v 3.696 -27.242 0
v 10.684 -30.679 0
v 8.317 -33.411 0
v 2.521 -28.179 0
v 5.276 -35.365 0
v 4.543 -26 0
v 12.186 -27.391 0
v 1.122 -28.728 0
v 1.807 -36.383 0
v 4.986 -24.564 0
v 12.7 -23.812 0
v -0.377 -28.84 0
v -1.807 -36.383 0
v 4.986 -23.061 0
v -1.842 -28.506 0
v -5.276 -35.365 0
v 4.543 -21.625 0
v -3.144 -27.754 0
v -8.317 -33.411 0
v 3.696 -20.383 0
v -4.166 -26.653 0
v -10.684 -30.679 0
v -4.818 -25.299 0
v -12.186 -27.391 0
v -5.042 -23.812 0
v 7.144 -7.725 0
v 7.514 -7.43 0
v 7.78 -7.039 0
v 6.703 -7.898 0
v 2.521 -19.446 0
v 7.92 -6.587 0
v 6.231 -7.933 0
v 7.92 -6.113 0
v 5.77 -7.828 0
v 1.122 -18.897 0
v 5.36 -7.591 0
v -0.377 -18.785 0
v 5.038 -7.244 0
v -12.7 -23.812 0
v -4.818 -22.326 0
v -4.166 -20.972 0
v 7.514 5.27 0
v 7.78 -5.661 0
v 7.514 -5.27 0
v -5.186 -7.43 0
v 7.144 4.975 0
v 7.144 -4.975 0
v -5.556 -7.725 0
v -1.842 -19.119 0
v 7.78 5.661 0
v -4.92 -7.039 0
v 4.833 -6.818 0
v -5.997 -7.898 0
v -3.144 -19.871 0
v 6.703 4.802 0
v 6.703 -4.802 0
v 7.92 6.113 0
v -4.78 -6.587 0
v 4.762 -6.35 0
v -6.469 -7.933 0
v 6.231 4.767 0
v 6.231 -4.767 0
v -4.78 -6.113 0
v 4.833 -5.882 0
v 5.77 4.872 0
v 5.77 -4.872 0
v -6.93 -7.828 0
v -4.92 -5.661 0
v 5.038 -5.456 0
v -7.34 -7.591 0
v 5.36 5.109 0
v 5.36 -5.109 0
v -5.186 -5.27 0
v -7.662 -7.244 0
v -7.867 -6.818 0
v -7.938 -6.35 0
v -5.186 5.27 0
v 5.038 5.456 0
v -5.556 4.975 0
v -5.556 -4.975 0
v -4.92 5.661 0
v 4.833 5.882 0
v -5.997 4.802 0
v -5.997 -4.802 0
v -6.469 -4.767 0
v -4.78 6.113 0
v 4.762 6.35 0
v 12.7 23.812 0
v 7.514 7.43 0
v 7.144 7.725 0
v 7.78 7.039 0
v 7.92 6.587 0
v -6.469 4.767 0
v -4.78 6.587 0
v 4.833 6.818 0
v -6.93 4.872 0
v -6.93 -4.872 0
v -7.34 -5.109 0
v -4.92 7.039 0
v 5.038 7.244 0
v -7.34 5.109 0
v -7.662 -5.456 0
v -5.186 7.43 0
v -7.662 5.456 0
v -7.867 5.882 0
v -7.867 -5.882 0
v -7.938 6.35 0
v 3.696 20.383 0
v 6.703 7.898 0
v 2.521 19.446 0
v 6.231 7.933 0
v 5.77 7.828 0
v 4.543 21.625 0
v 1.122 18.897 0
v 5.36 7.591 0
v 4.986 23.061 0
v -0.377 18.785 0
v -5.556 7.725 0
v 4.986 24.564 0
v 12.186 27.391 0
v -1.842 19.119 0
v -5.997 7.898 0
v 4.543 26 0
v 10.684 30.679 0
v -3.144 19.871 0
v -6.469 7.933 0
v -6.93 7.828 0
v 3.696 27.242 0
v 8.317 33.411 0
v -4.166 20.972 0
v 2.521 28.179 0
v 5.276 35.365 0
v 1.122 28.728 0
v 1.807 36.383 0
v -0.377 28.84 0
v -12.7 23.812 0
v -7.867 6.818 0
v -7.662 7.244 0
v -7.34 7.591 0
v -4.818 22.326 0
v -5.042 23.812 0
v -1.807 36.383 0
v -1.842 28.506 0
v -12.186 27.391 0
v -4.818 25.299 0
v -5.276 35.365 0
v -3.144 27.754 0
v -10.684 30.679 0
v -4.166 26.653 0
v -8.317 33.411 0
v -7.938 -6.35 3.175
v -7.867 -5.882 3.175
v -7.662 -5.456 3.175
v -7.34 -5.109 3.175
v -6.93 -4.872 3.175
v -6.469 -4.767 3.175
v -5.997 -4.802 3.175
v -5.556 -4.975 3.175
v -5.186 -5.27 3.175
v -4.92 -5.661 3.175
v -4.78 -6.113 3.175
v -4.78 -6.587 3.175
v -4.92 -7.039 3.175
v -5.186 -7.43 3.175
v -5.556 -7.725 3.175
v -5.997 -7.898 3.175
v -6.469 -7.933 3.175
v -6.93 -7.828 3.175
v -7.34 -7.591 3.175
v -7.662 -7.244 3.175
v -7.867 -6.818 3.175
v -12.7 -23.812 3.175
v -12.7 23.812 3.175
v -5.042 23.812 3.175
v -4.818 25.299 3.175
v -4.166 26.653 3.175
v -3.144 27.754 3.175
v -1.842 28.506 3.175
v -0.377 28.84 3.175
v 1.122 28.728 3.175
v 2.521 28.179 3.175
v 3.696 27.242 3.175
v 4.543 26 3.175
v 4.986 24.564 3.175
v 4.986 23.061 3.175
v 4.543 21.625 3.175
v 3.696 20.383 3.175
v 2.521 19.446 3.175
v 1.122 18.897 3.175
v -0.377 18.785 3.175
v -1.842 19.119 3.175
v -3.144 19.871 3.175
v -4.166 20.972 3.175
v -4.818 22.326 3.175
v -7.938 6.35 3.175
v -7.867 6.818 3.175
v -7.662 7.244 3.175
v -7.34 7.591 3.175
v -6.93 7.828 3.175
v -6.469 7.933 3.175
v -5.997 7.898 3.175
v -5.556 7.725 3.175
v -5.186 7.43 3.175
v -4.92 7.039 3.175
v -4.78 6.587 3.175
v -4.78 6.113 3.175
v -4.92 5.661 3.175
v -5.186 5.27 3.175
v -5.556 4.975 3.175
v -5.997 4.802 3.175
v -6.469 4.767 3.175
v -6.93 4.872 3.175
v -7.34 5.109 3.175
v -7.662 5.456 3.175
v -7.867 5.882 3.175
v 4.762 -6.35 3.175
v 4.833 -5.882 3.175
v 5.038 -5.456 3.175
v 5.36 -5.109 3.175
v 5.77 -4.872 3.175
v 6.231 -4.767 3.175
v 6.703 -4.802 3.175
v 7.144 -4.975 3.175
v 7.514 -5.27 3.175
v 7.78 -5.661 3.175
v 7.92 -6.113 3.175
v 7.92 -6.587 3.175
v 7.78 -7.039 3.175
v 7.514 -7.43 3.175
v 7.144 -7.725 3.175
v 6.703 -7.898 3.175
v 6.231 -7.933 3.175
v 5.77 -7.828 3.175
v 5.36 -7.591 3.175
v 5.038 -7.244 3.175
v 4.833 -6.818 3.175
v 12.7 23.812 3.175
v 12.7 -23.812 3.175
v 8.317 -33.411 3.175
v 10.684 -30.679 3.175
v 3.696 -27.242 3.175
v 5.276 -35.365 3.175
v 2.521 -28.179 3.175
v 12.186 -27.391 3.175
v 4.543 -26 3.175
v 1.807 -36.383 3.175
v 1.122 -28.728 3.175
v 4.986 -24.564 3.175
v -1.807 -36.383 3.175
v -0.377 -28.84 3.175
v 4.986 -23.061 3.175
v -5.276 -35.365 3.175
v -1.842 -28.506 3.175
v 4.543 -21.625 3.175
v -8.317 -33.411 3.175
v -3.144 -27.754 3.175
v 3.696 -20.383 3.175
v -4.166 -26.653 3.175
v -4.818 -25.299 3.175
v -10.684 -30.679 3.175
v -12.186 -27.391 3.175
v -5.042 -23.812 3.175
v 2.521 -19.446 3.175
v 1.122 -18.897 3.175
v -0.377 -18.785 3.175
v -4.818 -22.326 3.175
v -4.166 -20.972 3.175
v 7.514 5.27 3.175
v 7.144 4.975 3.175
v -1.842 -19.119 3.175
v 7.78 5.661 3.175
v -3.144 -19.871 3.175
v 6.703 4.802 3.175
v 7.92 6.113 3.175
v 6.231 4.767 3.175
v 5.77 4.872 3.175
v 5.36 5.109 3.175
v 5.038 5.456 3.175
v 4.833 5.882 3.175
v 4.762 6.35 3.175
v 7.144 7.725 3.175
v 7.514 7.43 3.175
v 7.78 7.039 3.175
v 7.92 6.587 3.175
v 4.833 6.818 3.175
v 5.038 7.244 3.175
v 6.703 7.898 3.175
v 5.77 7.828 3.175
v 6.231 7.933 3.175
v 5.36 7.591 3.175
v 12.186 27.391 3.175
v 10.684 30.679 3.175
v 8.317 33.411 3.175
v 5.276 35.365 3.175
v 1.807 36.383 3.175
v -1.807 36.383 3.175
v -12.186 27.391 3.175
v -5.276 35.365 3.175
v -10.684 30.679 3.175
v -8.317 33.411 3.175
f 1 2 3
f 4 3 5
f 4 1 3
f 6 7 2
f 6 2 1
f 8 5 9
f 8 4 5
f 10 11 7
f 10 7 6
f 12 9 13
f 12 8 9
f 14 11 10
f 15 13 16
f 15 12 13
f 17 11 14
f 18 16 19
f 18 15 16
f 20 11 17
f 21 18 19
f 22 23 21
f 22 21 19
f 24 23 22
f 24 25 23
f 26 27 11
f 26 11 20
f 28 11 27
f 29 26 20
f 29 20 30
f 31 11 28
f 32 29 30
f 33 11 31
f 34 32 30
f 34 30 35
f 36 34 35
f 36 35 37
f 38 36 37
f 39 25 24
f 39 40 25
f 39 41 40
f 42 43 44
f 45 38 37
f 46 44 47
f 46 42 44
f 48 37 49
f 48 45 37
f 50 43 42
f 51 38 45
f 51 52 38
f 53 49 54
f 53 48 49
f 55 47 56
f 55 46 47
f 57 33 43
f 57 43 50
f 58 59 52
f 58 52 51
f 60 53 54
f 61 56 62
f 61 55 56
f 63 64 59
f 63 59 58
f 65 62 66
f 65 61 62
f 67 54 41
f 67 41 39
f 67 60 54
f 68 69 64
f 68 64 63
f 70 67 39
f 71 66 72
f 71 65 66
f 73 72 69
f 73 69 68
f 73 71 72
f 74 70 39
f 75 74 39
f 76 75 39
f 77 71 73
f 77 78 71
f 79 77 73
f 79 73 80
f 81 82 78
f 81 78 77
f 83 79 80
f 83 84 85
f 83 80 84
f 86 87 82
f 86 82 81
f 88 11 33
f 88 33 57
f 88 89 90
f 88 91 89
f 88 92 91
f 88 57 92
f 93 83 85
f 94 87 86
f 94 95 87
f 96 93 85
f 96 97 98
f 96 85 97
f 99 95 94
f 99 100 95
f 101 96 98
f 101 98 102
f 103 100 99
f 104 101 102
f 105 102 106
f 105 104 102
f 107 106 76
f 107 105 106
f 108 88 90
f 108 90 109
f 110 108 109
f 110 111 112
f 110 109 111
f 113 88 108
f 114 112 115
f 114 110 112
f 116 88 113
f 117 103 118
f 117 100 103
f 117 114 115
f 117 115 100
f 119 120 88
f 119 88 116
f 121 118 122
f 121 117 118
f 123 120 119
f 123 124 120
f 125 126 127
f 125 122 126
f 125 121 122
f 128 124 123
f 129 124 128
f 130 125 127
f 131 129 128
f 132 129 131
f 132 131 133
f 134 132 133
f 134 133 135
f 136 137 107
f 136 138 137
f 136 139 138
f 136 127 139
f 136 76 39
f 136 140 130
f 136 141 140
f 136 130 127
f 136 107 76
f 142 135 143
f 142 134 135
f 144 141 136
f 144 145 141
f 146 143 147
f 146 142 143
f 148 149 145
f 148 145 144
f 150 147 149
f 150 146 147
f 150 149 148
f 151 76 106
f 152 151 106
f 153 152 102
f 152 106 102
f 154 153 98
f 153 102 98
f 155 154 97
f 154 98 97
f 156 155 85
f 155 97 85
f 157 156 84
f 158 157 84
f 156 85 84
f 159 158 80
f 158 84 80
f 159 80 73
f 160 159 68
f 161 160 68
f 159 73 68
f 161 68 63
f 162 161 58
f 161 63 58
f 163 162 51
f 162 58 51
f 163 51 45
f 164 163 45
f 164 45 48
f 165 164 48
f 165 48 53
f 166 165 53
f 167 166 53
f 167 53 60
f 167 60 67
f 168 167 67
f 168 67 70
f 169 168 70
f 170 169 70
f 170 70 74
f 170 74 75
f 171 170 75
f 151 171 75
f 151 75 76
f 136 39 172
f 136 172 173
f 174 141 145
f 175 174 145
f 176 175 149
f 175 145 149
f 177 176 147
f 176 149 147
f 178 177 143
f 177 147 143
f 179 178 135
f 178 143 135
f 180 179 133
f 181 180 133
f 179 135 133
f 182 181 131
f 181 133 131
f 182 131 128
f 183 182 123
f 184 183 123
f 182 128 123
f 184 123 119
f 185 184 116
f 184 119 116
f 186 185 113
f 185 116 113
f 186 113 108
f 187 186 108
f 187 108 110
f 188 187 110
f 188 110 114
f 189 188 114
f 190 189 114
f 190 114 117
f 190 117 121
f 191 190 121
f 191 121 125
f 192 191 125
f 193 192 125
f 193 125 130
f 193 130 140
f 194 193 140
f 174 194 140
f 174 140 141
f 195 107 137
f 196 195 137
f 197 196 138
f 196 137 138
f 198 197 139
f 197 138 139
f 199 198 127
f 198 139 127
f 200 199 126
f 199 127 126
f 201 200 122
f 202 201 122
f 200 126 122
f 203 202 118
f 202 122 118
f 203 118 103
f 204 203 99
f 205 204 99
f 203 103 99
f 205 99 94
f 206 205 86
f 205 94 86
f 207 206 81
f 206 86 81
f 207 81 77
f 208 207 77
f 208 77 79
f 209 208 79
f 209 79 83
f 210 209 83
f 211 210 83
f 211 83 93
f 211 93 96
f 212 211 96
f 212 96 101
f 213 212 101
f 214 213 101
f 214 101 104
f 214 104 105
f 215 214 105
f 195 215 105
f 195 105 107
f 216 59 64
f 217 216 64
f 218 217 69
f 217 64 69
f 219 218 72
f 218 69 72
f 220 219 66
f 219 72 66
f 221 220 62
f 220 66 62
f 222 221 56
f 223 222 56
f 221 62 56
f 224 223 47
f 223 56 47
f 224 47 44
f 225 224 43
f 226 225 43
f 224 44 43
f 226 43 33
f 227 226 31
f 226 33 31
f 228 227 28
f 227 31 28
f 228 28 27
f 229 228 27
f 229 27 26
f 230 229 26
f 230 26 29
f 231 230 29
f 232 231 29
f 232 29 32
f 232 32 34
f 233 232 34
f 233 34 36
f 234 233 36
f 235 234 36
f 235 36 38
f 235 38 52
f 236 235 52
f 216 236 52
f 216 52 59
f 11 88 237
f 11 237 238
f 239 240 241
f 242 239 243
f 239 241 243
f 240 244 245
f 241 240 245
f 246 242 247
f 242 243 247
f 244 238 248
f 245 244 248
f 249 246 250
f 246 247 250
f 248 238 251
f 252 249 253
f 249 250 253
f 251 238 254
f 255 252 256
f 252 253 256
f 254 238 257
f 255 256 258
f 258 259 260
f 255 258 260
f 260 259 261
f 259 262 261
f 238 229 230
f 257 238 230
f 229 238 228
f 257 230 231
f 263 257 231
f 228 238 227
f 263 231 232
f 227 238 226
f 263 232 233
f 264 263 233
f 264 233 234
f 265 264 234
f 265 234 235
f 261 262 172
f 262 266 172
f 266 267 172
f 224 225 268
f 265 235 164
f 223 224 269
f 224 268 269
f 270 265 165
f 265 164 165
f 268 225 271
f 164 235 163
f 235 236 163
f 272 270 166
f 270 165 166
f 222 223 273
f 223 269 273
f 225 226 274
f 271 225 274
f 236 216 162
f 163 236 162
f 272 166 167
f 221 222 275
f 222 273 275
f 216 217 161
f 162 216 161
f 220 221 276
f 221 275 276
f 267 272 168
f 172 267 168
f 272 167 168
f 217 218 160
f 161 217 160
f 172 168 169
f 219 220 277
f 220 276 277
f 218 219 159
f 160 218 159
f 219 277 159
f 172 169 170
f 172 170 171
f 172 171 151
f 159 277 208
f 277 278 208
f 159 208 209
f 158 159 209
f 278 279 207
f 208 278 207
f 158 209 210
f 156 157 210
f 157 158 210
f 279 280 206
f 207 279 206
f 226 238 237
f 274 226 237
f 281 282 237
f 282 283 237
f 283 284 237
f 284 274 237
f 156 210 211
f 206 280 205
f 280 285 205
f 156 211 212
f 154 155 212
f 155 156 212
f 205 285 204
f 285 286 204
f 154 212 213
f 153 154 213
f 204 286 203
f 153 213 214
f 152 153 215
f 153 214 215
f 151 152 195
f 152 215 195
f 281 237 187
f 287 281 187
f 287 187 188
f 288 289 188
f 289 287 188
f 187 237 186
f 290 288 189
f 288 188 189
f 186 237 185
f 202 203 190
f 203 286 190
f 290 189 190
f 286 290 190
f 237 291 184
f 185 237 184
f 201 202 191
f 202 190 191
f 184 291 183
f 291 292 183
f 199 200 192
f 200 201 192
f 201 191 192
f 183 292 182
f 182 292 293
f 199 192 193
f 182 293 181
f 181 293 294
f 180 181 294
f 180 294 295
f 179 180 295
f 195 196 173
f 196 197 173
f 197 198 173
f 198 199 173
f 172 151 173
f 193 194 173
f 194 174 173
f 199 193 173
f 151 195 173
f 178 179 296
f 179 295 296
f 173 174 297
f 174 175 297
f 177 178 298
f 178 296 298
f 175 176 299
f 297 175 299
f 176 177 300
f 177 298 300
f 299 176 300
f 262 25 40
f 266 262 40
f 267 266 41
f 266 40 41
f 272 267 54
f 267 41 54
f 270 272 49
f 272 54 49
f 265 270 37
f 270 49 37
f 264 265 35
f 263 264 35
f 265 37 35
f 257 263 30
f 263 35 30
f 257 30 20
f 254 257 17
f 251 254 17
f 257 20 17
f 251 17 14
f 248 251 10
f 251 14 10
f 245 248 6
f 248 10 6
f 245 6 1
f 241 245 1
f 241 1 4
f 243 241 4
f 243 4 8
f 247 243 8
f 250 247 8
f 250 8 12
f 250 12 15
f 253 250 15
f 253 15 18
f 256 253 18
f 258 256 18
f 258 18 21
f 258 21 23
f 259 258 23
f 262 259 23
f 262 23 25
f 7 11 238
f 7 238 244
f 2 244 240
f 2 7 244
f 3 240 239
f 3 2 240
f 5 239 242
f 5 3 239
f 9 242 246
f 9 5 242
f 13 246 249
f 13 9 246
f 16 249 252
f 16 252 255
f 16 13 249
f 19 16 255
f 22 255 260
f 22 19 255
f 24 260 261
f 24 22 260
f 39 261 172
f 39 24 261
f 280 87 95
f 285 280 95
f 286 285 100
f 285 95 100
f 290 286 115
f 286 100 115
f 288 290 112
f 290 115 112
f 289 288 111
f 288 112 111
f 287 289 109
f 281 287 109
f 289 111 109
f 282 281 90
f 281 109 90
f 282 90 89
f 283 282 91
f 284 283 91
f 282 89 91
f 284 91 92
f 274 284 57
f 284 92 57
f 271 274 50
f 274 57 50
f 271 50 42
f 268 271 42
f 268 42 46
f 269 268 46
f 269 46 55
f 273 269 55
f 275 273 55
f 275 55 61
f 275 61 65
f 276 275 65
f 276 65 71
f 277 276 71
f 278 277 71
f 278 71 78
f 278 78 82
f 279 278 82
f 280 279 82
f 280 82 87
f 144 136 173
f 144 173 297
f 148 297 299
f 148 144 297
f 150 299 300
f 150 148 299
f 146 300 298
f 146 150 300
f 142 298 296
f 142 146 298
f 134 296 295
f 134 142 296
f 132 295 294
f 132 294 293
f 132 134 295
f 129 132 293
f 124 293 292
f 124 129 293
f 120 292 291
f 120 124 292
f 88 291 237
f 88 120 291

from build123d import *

# Parameters (mm, degrees)
BOSS_EXTRUDE1_DEPTH          = 3.175
F_3_8_CLEARANCE_HOLE2_D      = 10.0838
F_1_8_0_125_DIAMETER_HOLE1_D = 3.175


with BuildPart() as part:
    # Sketch1 → Boss-Extrude1 (new body)
    with BuildSketch(Plane.XY):
        with BuildLine():
            Line((-12.7, -23.8125), (-12.7, 23.8125))
            ThreePointArc((-12.7, 23.8125), (0, 36.5125), (12.7, 23.8125))
            Line((12.7, 23.8125), (12.7, -23.8125))
            ThreePointArc((12.7, -23.8125), (0, -36.5125), (-12.7, -23.8125))
        make_face()
    extrude(amount=BOSS_EXTRUDE1_DEPTH)

    # 3/8 Clearance Hole2 (through all)
    with Locations(Plane.XY.offset(3.175)):
        with Locations((0, 23.8125), (0, -23.8125)):
            Hole(F_3_8_CLEARANCE_HOLE2_D / 2)

    # 1/8 (0.125) Diameter Hole1 (through all)
    with Locations(Plane.XY.offset(3.175)):
        with Locations((6.35, -6.35), (6.35, 6.35), (-6.35, -6.35), (-6.35, 6.35)):
            Hole(F_1_8_0_125_DIAMETER_HOLE1_D / 2)


solid = part.part
